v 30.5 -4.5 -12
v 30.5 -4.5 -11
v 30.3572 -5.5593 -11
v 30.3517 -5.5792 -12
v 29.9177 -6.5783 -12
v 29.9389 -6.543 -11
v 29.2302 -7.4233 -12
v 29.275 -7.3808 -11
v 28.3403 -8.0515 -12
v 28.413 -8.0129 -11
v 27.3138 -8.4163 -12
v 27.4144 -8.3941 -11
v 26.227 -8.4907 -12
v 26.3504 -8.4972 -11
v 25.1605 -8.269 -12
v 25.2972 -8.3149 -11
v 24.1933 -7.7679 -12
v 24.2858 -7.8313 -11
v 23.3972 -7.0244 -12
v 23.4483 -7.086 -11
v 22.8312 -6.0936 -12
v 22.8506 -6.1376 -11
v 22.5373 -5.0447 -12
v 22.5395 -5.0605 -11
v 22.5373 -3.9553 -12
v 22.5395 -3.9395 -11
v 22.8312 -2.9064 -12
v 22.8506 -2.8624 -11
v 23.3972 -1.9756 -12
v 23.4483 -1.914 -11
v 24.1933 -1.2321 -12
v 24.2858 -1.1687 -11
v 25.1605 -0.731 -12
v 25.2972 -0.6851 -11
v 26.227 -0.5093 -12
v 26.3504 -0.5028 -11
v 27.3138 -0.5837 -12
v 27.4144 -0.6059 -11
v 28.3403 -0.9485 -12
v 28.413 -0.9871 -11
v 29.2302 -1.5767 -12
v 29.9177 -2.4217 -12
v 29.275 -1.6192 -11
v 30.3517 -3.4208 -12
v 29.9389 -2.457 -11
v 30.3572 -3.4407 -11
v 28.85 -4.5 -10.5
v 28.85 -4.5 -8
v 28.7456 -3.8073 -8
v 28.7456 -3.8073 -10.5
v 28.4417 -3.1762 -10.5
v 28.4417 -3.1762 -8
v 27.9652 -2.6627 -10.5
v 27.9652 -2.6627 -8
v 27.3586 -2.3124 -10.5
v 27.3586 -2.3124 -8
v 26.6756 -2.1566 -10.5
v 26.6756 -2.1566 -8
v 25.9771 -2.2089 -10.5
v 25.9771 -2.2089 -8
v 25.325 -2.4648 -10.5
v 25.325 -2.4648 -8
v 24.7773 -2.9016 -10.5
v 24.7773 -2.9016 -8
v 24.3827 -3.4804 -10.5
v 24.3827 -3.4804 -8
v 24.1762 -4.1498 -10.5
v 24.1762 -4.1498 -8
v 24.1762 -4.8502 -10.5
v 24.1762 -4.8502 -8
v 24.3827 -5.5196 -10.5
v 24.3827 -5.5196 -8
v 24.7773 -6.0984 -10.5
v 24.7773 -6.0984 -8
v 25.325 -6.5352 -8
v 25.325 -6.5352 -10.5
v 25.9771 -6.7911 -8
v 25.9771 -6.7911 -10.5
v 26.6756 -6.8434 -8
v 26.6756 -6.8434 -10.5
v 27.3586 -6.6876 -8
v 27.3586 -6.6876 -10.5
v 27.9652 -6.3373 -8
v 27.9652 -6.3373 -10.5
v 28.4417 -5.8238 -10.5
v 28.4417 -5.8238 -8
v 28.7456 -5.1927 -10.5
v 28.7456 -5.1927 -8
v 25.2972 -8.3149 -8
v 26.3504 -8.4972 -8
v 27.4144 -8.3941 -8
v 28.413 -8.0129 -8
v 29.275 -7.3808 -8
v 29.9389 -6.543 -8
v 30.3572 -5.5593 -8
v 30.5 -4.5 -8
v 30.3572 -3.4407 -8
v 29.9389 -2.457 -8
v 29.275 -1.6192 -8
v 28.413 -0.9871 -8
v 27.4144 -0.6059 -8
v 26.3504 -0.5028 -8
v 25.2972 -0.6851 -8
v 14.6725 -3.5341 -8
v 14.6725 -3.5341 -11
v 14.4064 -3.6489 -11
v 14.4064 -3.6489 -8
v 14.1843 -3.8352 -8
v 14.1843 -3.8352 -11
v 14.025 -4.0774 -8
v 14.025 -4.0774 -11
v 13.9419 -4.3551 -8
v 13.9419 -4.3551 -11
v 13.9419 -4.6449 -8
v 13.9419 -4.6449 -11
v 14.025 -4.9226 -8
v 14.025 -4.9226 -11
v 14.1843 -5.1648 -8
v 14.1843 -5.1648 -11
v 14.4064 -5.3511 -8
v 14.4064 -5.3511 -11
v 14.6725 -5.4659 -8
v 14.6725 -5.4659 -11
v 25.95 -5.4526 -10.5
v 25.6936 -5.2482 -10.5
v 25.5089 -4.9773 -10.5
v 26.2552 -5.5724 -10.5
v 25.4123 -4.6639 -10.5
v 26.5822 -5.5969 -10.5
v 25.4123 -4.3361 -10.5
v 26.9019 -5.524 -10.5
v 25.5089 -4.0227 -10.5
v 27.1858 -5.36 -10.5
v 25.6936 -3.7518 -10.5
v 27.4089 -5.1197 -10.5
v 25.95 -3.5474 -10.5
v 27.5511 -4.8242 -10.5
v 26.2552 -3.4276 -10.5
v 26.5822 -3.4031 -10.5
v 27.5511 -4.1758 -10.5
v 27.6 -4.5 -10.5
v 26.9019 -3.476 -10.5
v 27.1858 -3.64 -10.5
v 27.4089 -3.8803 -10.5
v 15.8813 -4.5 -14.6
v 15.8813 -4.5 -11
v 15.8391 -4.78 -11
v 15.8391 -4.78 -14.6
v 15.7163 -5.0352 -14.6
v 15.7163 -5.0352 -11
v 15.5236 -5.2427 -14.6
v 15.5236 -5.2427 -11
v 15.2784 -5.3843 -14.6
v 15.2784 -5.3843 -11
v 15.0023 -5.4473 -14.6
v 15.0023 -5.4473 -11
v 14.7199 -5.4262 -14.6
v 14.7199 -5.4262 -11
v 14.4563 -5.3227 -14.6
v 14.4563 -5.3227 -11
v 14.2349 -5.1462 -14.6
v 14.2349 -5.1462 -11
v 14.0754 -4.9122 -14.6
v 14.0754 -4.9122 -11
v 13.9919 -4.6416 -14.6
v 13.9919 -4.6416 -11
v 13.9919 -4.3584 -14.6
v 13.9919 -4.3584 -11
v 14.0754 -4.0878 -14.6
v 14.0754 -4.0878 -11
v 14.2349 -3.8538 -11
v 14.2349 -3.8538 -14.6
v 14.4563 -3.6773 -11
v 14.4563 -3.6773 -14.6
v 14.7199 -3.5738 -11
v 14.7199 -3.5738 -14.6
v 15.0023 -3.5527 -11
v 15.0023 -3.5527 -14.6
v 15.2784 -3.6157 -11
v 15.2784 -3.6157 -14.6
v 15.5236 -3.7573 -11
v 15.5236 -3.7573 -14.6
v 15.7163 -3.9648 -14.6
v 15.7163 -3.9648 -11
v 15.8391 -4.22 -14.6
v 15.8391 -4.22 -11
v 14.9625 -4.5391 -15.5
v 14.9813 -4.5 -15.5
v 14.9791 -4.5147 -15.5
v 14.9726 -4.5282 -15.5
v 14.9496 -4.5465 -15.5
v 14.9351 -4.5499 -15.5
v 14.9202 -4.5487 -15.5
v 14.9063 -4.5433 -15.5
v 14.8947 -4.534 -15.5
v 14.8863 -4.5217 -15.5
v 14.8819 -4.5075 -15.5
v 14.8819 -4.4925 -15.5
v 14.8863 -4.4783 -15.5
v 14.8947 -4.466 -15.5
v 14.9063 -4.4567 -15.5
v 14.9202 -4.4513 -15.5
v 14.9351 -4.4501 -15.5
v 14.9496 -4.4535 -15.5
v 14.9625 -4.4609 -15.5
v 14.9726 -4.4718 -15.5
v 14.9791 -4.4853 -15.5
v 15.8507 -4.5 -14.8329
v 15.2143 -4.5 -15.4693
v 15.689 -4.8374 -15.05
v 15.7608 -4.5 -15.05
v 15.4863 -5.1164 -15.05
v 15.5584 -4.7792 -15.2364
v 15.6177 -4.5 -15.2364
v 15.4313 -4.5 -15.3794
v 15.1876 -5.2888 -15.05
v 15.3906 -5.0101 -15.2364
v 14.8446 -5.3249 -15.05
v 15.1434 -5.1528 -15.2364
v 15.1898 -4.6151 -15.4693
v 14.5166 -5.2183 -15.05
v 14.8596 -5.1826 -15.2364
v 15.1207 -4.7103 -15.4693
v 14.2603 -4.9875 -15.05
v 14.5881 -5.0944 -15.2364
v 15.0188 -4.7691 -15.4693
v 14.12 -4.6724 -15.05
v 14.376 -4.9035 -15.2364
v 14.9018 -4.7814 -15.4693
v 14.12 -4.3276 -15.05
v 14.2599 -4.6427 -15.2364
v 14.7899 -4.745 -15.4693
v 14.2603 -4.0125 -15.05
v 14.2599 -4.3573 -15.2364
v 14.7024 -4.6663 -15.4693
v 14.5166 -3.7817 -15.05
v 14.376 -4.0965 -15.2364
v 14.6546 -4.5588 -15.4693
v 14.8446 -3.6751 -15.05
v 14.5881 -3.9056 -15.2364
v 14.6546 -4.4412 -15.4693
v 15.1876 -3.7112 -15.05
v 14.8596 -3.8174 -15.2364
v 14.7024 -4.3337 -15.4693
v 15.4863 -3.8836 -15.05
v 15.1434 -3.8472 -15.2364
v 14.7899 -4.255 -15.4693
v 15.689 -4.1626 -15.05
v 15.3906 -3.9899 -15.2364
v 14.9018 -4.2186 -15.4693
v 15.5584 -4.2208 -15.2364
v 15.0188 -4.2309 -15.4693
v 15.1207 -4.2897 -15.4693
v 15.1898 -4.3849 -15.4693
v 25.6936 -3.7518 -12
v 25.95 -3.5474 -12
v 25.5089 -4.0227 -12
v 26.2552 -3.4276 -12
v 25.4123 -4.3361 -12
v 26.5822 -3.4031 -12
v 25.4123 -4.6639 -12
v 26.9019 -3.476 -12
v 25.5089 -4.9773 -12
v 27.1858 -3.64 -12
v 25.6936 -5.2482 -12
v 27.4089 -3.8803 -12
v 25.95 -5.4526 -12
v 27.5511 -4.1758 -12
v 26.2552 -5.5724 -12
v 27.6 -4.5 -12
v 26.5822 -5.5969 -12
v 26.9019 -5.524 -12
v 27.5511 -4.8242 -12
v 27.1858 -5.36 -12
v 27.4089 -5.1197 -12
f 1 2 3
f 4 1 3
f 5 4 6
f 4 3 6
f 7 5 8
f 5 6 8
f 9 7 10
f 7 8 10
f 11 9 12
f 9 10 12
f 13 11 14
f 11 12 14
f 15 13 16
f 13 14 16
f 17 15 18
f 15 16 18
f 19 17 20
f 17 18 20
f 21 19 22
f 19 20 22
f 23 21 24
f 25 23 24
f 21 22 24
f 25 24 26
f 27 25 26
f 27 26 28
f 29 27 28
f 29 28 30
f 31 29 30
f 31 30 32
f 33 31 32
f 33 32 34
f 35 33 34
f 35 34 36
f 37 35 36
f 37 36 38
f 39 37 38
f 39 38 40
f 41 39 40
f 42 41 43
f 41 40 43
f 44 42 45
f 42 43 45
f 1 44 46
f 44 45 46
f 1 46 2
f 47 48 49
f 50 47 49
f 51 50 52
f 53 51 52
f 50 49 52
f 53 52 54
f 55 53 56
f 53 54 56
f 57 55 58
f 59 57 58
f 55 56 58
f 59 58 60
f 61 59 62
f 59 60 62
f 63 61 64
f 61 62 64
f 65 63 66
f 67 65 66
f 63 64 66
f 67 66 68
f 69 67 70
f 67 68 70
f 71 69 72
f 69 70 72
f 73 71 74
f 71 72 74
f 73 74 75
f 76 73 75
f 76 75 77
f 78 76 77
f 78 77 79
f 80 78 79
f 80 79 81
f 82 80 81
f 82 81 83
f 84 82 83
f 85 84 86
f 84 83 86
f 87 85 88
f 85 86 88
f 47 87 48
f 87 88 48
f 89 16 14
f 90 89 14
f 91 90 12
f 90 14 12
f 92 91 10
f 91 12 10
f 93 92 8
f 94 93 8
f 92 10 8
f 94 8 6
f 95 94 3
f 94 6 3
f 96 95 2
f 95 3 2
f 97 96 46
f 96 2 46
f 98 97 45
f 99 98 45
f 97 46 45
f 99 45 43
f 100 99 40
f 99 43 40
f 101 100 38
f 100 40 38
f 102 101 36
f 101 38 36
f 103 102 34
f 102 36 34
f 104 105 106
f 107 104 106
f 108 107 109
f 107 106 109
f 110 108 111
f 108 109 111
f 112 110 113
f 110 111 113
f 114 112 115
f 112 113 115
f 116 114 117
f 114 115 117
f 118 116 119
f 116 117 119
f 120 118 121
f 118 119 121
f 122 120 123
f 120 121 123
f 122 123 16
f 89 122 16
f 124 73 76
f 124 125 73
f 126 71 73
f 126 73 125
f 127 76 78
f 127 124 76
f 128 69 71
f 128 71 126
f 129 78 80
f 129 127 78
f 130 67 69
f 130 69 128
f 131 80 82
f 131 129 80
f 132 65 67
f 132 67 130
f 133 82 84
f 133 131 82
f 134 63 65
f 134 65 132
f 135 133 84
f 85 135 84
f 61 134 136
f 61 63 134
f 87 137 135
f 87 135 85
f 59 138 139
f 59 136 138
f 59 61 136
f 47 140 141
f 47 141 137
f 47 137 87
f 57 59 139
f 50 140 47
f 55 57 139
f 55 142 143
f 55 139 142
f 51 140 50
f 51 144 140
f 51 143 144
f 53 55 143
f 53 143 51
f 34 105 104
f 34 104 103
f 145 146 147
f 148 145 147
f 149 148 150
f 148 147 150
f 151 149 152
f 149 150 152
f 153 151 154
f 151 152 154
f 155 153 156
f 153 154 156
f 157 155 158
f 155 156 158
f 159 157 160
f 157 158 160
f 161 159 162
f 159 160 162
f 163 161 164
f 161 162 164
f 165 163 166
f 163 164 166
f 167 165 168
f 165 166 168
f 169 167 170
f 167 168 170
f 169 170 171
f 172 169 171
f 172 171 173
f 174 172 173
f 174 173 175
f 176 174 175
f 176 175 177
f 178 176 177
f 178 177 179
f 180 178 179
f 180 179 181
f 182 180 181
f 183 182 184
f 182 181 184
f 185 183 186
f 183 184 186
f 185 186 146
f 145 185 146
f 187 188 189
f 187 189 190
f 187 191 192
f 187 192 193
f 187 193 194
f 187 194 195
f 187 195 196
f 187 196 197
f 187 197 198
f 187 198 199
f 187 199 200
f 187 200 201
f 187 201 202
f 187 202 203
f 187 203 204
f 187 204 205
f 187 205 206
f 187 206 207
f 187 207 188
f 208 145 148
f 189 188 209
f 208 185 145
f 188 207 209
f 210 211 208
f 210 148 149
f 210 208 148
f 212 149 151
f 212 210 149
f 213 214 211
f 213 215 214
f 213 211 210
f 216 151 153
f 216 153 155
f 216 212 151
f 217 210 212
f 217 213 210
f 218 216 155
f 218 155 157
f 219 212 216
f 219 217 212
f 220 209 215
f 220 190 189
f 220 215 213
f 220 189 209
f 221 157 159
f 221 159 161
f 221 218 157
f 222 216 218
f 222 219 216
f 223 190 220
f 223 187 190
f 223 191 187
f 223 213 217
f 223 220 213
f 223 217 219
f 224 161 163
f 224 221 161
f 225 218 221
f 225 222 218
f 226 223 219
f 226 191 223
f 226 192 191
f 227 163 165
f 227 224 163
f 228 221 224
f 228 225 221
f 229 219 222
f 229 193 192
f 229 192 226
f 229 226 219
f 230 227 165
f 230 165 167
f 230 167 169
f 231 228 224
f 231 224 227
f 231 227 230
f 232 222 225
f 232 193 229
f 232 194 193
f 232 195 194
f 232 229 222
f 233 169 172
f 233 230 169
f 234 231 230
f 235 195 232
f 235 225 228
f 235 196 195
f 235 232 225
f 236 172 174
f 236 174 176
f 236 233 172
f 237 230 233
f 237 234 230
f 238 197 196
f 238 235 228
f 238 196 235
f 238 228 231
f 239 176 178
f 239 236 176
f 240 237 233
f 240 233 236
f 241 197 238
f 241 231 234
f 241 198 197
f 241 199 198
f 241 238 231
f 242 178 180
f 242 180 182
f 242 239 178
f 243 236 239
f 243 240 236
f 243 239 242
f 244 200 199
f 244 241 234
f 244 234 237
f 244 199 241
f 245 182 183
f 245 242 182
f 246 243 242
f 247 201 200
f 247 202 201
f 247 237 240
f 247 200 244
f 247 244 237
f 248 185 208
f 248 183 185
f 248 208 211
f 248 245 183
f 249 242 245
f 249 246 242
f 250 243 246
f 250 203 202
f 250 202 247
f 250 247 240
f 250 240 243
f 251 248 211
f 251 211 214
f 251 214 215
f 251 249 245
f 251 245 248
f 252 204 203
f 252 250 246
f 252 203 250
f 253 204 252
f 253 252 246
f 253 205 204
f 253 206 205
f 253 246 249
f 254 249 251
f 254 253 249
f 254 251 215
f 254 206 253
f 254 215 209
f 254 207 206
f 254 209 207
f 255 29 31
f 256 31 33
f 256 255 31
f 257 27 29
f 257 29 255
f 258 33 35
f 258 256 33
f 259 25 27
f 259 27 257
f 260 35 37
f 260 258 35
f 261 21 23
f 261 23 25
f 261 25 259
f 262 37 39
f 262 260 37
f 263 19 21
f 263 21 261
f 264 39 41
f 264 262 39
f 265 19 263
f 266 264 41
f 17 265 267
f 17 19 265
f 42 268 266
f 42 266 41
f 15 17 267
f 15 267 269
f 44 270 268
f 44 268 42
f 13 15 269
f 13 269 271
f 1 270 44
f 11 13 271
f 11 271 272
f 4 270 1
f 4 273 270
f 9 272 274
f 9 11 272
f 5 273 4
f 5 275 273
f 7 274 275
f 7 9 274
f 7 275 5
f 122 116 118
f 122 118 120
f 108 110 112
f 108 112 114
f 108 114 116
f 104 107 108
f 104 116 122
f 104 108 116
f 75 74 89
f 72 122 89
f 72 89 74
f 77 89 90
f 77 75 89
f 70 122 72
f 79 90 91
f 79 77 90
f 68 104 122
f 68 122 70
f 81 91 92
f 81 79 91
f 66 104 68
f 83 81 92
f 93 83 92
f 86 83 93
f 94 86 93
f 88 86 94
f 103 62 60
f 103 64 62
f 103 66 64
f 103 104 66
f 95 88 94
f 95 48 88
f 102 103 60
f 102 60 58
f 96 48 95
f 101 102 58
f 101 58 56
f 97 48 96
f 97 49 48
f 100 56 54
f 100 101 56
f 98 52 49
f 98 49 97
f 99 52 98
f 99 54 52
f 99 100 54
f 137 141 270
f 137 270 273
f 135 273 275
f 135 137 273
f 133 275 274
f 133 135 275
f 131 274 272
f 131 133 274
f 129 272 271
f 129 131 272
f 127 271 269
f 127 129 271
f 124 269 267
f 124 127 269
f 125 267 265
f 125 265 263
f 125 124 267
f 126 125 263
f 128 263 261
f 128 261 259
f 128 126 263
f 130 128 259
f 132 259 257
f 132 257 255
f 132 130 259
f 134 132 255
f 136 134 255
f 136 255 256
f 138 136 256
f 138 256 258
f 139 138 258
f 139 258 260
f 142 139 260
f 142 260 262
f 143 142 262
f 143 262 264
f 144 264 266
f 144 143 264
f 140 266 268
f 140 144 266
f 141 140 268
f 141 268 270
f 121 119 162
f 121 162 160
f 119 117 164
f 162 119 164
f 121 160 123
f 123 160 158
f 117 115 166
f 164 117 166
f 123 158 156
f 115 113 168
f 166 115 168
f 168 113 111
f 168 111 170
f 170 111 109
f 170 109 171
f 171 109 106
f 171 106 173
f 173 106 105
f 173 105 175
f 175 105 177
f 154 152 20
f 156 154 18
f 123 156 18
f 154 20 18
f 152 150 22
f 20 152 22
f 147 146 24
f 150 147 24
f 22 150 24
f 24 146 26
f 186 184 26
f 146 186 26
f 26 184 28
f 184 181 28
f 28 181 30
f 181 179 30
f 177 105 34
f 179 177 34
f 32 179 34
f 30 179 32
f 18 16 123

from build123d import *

# Parameters (mm, degrees)
SKETCH012_R     = 1.1
PAD007_DEPTH    = 3
SKETCH013_R     = 4
SKETCH013_R_2   = 1.1
PAD008_DEPTH    = 1
SKETCH014_R     = 0.95
PAD009_DEPTH    = 4.5
SKETCH016_R     = 2.35
POCKET003_DEPTH = 2.5
FILLET002_R     = 0.9


with BuildPart() as part:
    # Sketch012 → Pad007 (new body)
    with BuildSketch(Plane(origin=(26.5, -4.5, -11), x_dir=(1, 0, 0), z_dir=(0, 0, 1))):
        with BuildLine():
            Line((-11.827489, -0.965926), (-1.202823, -3.814868))
            ThreePointArc((-1.202823, -3.814868), (4, 0), (-1.202823, 3.814868))
            Line((-11.827489, 0.965926), (-1.202823, 3.814868))
            ThreePointArc((-11.827489, 0.965926), (-12.56867, 0), (-11.827489, -0.965926))
        make_face()
        Circle(SKETCH012_R, mode=Mode.SUBTRACT)
    extrude(amount=PAD007_DEPTH)

    # Sketch013 → Pad008 (new body)
    with BuildSketch(Plane(origin=(26.5, -4.5, -11), x_dir=(1, 0, 0), z_dir=(0, 0, -1))):
        Circle(SKETCH013_R)
        Circle(SKETCH013_R_2, mode=Mode.SUBTRACT)
    extrude(amount=PAD008_DEPTH)

    # Sketch014 → Pad009 (new body)
    with BuildSketch(Plane(origin=(26.5, -4.5, -11), x_dir=(1, 0, 0), z_dir=(0, 0, -1))):
        with Locations((-11.56867, 0)):
            Circle(SKETCH014_R)
    extrude(amount=PAD009_DEPTH)

    # Sketch016 → Pocket003 (cut)
    with BuildSketch(Plane(origin=(26.5, -4.5, -8), x_dir=(1, 0, 0), z_dir=(0, 0, 1))):
        Circle(SKETCH016_R)
    extrude(amount=-POCKET003_DEPTH, mode=Mode.SUBTRACT)

    # Fillet002
    fillet002_edges = [part.edges().sort_by_distance(p)[0] for p in [
        (13.98133, -4.5, -15.5),
    ]]
    fillet(fillet002_edges, radius=FILLET002_R)


solid = part.part
